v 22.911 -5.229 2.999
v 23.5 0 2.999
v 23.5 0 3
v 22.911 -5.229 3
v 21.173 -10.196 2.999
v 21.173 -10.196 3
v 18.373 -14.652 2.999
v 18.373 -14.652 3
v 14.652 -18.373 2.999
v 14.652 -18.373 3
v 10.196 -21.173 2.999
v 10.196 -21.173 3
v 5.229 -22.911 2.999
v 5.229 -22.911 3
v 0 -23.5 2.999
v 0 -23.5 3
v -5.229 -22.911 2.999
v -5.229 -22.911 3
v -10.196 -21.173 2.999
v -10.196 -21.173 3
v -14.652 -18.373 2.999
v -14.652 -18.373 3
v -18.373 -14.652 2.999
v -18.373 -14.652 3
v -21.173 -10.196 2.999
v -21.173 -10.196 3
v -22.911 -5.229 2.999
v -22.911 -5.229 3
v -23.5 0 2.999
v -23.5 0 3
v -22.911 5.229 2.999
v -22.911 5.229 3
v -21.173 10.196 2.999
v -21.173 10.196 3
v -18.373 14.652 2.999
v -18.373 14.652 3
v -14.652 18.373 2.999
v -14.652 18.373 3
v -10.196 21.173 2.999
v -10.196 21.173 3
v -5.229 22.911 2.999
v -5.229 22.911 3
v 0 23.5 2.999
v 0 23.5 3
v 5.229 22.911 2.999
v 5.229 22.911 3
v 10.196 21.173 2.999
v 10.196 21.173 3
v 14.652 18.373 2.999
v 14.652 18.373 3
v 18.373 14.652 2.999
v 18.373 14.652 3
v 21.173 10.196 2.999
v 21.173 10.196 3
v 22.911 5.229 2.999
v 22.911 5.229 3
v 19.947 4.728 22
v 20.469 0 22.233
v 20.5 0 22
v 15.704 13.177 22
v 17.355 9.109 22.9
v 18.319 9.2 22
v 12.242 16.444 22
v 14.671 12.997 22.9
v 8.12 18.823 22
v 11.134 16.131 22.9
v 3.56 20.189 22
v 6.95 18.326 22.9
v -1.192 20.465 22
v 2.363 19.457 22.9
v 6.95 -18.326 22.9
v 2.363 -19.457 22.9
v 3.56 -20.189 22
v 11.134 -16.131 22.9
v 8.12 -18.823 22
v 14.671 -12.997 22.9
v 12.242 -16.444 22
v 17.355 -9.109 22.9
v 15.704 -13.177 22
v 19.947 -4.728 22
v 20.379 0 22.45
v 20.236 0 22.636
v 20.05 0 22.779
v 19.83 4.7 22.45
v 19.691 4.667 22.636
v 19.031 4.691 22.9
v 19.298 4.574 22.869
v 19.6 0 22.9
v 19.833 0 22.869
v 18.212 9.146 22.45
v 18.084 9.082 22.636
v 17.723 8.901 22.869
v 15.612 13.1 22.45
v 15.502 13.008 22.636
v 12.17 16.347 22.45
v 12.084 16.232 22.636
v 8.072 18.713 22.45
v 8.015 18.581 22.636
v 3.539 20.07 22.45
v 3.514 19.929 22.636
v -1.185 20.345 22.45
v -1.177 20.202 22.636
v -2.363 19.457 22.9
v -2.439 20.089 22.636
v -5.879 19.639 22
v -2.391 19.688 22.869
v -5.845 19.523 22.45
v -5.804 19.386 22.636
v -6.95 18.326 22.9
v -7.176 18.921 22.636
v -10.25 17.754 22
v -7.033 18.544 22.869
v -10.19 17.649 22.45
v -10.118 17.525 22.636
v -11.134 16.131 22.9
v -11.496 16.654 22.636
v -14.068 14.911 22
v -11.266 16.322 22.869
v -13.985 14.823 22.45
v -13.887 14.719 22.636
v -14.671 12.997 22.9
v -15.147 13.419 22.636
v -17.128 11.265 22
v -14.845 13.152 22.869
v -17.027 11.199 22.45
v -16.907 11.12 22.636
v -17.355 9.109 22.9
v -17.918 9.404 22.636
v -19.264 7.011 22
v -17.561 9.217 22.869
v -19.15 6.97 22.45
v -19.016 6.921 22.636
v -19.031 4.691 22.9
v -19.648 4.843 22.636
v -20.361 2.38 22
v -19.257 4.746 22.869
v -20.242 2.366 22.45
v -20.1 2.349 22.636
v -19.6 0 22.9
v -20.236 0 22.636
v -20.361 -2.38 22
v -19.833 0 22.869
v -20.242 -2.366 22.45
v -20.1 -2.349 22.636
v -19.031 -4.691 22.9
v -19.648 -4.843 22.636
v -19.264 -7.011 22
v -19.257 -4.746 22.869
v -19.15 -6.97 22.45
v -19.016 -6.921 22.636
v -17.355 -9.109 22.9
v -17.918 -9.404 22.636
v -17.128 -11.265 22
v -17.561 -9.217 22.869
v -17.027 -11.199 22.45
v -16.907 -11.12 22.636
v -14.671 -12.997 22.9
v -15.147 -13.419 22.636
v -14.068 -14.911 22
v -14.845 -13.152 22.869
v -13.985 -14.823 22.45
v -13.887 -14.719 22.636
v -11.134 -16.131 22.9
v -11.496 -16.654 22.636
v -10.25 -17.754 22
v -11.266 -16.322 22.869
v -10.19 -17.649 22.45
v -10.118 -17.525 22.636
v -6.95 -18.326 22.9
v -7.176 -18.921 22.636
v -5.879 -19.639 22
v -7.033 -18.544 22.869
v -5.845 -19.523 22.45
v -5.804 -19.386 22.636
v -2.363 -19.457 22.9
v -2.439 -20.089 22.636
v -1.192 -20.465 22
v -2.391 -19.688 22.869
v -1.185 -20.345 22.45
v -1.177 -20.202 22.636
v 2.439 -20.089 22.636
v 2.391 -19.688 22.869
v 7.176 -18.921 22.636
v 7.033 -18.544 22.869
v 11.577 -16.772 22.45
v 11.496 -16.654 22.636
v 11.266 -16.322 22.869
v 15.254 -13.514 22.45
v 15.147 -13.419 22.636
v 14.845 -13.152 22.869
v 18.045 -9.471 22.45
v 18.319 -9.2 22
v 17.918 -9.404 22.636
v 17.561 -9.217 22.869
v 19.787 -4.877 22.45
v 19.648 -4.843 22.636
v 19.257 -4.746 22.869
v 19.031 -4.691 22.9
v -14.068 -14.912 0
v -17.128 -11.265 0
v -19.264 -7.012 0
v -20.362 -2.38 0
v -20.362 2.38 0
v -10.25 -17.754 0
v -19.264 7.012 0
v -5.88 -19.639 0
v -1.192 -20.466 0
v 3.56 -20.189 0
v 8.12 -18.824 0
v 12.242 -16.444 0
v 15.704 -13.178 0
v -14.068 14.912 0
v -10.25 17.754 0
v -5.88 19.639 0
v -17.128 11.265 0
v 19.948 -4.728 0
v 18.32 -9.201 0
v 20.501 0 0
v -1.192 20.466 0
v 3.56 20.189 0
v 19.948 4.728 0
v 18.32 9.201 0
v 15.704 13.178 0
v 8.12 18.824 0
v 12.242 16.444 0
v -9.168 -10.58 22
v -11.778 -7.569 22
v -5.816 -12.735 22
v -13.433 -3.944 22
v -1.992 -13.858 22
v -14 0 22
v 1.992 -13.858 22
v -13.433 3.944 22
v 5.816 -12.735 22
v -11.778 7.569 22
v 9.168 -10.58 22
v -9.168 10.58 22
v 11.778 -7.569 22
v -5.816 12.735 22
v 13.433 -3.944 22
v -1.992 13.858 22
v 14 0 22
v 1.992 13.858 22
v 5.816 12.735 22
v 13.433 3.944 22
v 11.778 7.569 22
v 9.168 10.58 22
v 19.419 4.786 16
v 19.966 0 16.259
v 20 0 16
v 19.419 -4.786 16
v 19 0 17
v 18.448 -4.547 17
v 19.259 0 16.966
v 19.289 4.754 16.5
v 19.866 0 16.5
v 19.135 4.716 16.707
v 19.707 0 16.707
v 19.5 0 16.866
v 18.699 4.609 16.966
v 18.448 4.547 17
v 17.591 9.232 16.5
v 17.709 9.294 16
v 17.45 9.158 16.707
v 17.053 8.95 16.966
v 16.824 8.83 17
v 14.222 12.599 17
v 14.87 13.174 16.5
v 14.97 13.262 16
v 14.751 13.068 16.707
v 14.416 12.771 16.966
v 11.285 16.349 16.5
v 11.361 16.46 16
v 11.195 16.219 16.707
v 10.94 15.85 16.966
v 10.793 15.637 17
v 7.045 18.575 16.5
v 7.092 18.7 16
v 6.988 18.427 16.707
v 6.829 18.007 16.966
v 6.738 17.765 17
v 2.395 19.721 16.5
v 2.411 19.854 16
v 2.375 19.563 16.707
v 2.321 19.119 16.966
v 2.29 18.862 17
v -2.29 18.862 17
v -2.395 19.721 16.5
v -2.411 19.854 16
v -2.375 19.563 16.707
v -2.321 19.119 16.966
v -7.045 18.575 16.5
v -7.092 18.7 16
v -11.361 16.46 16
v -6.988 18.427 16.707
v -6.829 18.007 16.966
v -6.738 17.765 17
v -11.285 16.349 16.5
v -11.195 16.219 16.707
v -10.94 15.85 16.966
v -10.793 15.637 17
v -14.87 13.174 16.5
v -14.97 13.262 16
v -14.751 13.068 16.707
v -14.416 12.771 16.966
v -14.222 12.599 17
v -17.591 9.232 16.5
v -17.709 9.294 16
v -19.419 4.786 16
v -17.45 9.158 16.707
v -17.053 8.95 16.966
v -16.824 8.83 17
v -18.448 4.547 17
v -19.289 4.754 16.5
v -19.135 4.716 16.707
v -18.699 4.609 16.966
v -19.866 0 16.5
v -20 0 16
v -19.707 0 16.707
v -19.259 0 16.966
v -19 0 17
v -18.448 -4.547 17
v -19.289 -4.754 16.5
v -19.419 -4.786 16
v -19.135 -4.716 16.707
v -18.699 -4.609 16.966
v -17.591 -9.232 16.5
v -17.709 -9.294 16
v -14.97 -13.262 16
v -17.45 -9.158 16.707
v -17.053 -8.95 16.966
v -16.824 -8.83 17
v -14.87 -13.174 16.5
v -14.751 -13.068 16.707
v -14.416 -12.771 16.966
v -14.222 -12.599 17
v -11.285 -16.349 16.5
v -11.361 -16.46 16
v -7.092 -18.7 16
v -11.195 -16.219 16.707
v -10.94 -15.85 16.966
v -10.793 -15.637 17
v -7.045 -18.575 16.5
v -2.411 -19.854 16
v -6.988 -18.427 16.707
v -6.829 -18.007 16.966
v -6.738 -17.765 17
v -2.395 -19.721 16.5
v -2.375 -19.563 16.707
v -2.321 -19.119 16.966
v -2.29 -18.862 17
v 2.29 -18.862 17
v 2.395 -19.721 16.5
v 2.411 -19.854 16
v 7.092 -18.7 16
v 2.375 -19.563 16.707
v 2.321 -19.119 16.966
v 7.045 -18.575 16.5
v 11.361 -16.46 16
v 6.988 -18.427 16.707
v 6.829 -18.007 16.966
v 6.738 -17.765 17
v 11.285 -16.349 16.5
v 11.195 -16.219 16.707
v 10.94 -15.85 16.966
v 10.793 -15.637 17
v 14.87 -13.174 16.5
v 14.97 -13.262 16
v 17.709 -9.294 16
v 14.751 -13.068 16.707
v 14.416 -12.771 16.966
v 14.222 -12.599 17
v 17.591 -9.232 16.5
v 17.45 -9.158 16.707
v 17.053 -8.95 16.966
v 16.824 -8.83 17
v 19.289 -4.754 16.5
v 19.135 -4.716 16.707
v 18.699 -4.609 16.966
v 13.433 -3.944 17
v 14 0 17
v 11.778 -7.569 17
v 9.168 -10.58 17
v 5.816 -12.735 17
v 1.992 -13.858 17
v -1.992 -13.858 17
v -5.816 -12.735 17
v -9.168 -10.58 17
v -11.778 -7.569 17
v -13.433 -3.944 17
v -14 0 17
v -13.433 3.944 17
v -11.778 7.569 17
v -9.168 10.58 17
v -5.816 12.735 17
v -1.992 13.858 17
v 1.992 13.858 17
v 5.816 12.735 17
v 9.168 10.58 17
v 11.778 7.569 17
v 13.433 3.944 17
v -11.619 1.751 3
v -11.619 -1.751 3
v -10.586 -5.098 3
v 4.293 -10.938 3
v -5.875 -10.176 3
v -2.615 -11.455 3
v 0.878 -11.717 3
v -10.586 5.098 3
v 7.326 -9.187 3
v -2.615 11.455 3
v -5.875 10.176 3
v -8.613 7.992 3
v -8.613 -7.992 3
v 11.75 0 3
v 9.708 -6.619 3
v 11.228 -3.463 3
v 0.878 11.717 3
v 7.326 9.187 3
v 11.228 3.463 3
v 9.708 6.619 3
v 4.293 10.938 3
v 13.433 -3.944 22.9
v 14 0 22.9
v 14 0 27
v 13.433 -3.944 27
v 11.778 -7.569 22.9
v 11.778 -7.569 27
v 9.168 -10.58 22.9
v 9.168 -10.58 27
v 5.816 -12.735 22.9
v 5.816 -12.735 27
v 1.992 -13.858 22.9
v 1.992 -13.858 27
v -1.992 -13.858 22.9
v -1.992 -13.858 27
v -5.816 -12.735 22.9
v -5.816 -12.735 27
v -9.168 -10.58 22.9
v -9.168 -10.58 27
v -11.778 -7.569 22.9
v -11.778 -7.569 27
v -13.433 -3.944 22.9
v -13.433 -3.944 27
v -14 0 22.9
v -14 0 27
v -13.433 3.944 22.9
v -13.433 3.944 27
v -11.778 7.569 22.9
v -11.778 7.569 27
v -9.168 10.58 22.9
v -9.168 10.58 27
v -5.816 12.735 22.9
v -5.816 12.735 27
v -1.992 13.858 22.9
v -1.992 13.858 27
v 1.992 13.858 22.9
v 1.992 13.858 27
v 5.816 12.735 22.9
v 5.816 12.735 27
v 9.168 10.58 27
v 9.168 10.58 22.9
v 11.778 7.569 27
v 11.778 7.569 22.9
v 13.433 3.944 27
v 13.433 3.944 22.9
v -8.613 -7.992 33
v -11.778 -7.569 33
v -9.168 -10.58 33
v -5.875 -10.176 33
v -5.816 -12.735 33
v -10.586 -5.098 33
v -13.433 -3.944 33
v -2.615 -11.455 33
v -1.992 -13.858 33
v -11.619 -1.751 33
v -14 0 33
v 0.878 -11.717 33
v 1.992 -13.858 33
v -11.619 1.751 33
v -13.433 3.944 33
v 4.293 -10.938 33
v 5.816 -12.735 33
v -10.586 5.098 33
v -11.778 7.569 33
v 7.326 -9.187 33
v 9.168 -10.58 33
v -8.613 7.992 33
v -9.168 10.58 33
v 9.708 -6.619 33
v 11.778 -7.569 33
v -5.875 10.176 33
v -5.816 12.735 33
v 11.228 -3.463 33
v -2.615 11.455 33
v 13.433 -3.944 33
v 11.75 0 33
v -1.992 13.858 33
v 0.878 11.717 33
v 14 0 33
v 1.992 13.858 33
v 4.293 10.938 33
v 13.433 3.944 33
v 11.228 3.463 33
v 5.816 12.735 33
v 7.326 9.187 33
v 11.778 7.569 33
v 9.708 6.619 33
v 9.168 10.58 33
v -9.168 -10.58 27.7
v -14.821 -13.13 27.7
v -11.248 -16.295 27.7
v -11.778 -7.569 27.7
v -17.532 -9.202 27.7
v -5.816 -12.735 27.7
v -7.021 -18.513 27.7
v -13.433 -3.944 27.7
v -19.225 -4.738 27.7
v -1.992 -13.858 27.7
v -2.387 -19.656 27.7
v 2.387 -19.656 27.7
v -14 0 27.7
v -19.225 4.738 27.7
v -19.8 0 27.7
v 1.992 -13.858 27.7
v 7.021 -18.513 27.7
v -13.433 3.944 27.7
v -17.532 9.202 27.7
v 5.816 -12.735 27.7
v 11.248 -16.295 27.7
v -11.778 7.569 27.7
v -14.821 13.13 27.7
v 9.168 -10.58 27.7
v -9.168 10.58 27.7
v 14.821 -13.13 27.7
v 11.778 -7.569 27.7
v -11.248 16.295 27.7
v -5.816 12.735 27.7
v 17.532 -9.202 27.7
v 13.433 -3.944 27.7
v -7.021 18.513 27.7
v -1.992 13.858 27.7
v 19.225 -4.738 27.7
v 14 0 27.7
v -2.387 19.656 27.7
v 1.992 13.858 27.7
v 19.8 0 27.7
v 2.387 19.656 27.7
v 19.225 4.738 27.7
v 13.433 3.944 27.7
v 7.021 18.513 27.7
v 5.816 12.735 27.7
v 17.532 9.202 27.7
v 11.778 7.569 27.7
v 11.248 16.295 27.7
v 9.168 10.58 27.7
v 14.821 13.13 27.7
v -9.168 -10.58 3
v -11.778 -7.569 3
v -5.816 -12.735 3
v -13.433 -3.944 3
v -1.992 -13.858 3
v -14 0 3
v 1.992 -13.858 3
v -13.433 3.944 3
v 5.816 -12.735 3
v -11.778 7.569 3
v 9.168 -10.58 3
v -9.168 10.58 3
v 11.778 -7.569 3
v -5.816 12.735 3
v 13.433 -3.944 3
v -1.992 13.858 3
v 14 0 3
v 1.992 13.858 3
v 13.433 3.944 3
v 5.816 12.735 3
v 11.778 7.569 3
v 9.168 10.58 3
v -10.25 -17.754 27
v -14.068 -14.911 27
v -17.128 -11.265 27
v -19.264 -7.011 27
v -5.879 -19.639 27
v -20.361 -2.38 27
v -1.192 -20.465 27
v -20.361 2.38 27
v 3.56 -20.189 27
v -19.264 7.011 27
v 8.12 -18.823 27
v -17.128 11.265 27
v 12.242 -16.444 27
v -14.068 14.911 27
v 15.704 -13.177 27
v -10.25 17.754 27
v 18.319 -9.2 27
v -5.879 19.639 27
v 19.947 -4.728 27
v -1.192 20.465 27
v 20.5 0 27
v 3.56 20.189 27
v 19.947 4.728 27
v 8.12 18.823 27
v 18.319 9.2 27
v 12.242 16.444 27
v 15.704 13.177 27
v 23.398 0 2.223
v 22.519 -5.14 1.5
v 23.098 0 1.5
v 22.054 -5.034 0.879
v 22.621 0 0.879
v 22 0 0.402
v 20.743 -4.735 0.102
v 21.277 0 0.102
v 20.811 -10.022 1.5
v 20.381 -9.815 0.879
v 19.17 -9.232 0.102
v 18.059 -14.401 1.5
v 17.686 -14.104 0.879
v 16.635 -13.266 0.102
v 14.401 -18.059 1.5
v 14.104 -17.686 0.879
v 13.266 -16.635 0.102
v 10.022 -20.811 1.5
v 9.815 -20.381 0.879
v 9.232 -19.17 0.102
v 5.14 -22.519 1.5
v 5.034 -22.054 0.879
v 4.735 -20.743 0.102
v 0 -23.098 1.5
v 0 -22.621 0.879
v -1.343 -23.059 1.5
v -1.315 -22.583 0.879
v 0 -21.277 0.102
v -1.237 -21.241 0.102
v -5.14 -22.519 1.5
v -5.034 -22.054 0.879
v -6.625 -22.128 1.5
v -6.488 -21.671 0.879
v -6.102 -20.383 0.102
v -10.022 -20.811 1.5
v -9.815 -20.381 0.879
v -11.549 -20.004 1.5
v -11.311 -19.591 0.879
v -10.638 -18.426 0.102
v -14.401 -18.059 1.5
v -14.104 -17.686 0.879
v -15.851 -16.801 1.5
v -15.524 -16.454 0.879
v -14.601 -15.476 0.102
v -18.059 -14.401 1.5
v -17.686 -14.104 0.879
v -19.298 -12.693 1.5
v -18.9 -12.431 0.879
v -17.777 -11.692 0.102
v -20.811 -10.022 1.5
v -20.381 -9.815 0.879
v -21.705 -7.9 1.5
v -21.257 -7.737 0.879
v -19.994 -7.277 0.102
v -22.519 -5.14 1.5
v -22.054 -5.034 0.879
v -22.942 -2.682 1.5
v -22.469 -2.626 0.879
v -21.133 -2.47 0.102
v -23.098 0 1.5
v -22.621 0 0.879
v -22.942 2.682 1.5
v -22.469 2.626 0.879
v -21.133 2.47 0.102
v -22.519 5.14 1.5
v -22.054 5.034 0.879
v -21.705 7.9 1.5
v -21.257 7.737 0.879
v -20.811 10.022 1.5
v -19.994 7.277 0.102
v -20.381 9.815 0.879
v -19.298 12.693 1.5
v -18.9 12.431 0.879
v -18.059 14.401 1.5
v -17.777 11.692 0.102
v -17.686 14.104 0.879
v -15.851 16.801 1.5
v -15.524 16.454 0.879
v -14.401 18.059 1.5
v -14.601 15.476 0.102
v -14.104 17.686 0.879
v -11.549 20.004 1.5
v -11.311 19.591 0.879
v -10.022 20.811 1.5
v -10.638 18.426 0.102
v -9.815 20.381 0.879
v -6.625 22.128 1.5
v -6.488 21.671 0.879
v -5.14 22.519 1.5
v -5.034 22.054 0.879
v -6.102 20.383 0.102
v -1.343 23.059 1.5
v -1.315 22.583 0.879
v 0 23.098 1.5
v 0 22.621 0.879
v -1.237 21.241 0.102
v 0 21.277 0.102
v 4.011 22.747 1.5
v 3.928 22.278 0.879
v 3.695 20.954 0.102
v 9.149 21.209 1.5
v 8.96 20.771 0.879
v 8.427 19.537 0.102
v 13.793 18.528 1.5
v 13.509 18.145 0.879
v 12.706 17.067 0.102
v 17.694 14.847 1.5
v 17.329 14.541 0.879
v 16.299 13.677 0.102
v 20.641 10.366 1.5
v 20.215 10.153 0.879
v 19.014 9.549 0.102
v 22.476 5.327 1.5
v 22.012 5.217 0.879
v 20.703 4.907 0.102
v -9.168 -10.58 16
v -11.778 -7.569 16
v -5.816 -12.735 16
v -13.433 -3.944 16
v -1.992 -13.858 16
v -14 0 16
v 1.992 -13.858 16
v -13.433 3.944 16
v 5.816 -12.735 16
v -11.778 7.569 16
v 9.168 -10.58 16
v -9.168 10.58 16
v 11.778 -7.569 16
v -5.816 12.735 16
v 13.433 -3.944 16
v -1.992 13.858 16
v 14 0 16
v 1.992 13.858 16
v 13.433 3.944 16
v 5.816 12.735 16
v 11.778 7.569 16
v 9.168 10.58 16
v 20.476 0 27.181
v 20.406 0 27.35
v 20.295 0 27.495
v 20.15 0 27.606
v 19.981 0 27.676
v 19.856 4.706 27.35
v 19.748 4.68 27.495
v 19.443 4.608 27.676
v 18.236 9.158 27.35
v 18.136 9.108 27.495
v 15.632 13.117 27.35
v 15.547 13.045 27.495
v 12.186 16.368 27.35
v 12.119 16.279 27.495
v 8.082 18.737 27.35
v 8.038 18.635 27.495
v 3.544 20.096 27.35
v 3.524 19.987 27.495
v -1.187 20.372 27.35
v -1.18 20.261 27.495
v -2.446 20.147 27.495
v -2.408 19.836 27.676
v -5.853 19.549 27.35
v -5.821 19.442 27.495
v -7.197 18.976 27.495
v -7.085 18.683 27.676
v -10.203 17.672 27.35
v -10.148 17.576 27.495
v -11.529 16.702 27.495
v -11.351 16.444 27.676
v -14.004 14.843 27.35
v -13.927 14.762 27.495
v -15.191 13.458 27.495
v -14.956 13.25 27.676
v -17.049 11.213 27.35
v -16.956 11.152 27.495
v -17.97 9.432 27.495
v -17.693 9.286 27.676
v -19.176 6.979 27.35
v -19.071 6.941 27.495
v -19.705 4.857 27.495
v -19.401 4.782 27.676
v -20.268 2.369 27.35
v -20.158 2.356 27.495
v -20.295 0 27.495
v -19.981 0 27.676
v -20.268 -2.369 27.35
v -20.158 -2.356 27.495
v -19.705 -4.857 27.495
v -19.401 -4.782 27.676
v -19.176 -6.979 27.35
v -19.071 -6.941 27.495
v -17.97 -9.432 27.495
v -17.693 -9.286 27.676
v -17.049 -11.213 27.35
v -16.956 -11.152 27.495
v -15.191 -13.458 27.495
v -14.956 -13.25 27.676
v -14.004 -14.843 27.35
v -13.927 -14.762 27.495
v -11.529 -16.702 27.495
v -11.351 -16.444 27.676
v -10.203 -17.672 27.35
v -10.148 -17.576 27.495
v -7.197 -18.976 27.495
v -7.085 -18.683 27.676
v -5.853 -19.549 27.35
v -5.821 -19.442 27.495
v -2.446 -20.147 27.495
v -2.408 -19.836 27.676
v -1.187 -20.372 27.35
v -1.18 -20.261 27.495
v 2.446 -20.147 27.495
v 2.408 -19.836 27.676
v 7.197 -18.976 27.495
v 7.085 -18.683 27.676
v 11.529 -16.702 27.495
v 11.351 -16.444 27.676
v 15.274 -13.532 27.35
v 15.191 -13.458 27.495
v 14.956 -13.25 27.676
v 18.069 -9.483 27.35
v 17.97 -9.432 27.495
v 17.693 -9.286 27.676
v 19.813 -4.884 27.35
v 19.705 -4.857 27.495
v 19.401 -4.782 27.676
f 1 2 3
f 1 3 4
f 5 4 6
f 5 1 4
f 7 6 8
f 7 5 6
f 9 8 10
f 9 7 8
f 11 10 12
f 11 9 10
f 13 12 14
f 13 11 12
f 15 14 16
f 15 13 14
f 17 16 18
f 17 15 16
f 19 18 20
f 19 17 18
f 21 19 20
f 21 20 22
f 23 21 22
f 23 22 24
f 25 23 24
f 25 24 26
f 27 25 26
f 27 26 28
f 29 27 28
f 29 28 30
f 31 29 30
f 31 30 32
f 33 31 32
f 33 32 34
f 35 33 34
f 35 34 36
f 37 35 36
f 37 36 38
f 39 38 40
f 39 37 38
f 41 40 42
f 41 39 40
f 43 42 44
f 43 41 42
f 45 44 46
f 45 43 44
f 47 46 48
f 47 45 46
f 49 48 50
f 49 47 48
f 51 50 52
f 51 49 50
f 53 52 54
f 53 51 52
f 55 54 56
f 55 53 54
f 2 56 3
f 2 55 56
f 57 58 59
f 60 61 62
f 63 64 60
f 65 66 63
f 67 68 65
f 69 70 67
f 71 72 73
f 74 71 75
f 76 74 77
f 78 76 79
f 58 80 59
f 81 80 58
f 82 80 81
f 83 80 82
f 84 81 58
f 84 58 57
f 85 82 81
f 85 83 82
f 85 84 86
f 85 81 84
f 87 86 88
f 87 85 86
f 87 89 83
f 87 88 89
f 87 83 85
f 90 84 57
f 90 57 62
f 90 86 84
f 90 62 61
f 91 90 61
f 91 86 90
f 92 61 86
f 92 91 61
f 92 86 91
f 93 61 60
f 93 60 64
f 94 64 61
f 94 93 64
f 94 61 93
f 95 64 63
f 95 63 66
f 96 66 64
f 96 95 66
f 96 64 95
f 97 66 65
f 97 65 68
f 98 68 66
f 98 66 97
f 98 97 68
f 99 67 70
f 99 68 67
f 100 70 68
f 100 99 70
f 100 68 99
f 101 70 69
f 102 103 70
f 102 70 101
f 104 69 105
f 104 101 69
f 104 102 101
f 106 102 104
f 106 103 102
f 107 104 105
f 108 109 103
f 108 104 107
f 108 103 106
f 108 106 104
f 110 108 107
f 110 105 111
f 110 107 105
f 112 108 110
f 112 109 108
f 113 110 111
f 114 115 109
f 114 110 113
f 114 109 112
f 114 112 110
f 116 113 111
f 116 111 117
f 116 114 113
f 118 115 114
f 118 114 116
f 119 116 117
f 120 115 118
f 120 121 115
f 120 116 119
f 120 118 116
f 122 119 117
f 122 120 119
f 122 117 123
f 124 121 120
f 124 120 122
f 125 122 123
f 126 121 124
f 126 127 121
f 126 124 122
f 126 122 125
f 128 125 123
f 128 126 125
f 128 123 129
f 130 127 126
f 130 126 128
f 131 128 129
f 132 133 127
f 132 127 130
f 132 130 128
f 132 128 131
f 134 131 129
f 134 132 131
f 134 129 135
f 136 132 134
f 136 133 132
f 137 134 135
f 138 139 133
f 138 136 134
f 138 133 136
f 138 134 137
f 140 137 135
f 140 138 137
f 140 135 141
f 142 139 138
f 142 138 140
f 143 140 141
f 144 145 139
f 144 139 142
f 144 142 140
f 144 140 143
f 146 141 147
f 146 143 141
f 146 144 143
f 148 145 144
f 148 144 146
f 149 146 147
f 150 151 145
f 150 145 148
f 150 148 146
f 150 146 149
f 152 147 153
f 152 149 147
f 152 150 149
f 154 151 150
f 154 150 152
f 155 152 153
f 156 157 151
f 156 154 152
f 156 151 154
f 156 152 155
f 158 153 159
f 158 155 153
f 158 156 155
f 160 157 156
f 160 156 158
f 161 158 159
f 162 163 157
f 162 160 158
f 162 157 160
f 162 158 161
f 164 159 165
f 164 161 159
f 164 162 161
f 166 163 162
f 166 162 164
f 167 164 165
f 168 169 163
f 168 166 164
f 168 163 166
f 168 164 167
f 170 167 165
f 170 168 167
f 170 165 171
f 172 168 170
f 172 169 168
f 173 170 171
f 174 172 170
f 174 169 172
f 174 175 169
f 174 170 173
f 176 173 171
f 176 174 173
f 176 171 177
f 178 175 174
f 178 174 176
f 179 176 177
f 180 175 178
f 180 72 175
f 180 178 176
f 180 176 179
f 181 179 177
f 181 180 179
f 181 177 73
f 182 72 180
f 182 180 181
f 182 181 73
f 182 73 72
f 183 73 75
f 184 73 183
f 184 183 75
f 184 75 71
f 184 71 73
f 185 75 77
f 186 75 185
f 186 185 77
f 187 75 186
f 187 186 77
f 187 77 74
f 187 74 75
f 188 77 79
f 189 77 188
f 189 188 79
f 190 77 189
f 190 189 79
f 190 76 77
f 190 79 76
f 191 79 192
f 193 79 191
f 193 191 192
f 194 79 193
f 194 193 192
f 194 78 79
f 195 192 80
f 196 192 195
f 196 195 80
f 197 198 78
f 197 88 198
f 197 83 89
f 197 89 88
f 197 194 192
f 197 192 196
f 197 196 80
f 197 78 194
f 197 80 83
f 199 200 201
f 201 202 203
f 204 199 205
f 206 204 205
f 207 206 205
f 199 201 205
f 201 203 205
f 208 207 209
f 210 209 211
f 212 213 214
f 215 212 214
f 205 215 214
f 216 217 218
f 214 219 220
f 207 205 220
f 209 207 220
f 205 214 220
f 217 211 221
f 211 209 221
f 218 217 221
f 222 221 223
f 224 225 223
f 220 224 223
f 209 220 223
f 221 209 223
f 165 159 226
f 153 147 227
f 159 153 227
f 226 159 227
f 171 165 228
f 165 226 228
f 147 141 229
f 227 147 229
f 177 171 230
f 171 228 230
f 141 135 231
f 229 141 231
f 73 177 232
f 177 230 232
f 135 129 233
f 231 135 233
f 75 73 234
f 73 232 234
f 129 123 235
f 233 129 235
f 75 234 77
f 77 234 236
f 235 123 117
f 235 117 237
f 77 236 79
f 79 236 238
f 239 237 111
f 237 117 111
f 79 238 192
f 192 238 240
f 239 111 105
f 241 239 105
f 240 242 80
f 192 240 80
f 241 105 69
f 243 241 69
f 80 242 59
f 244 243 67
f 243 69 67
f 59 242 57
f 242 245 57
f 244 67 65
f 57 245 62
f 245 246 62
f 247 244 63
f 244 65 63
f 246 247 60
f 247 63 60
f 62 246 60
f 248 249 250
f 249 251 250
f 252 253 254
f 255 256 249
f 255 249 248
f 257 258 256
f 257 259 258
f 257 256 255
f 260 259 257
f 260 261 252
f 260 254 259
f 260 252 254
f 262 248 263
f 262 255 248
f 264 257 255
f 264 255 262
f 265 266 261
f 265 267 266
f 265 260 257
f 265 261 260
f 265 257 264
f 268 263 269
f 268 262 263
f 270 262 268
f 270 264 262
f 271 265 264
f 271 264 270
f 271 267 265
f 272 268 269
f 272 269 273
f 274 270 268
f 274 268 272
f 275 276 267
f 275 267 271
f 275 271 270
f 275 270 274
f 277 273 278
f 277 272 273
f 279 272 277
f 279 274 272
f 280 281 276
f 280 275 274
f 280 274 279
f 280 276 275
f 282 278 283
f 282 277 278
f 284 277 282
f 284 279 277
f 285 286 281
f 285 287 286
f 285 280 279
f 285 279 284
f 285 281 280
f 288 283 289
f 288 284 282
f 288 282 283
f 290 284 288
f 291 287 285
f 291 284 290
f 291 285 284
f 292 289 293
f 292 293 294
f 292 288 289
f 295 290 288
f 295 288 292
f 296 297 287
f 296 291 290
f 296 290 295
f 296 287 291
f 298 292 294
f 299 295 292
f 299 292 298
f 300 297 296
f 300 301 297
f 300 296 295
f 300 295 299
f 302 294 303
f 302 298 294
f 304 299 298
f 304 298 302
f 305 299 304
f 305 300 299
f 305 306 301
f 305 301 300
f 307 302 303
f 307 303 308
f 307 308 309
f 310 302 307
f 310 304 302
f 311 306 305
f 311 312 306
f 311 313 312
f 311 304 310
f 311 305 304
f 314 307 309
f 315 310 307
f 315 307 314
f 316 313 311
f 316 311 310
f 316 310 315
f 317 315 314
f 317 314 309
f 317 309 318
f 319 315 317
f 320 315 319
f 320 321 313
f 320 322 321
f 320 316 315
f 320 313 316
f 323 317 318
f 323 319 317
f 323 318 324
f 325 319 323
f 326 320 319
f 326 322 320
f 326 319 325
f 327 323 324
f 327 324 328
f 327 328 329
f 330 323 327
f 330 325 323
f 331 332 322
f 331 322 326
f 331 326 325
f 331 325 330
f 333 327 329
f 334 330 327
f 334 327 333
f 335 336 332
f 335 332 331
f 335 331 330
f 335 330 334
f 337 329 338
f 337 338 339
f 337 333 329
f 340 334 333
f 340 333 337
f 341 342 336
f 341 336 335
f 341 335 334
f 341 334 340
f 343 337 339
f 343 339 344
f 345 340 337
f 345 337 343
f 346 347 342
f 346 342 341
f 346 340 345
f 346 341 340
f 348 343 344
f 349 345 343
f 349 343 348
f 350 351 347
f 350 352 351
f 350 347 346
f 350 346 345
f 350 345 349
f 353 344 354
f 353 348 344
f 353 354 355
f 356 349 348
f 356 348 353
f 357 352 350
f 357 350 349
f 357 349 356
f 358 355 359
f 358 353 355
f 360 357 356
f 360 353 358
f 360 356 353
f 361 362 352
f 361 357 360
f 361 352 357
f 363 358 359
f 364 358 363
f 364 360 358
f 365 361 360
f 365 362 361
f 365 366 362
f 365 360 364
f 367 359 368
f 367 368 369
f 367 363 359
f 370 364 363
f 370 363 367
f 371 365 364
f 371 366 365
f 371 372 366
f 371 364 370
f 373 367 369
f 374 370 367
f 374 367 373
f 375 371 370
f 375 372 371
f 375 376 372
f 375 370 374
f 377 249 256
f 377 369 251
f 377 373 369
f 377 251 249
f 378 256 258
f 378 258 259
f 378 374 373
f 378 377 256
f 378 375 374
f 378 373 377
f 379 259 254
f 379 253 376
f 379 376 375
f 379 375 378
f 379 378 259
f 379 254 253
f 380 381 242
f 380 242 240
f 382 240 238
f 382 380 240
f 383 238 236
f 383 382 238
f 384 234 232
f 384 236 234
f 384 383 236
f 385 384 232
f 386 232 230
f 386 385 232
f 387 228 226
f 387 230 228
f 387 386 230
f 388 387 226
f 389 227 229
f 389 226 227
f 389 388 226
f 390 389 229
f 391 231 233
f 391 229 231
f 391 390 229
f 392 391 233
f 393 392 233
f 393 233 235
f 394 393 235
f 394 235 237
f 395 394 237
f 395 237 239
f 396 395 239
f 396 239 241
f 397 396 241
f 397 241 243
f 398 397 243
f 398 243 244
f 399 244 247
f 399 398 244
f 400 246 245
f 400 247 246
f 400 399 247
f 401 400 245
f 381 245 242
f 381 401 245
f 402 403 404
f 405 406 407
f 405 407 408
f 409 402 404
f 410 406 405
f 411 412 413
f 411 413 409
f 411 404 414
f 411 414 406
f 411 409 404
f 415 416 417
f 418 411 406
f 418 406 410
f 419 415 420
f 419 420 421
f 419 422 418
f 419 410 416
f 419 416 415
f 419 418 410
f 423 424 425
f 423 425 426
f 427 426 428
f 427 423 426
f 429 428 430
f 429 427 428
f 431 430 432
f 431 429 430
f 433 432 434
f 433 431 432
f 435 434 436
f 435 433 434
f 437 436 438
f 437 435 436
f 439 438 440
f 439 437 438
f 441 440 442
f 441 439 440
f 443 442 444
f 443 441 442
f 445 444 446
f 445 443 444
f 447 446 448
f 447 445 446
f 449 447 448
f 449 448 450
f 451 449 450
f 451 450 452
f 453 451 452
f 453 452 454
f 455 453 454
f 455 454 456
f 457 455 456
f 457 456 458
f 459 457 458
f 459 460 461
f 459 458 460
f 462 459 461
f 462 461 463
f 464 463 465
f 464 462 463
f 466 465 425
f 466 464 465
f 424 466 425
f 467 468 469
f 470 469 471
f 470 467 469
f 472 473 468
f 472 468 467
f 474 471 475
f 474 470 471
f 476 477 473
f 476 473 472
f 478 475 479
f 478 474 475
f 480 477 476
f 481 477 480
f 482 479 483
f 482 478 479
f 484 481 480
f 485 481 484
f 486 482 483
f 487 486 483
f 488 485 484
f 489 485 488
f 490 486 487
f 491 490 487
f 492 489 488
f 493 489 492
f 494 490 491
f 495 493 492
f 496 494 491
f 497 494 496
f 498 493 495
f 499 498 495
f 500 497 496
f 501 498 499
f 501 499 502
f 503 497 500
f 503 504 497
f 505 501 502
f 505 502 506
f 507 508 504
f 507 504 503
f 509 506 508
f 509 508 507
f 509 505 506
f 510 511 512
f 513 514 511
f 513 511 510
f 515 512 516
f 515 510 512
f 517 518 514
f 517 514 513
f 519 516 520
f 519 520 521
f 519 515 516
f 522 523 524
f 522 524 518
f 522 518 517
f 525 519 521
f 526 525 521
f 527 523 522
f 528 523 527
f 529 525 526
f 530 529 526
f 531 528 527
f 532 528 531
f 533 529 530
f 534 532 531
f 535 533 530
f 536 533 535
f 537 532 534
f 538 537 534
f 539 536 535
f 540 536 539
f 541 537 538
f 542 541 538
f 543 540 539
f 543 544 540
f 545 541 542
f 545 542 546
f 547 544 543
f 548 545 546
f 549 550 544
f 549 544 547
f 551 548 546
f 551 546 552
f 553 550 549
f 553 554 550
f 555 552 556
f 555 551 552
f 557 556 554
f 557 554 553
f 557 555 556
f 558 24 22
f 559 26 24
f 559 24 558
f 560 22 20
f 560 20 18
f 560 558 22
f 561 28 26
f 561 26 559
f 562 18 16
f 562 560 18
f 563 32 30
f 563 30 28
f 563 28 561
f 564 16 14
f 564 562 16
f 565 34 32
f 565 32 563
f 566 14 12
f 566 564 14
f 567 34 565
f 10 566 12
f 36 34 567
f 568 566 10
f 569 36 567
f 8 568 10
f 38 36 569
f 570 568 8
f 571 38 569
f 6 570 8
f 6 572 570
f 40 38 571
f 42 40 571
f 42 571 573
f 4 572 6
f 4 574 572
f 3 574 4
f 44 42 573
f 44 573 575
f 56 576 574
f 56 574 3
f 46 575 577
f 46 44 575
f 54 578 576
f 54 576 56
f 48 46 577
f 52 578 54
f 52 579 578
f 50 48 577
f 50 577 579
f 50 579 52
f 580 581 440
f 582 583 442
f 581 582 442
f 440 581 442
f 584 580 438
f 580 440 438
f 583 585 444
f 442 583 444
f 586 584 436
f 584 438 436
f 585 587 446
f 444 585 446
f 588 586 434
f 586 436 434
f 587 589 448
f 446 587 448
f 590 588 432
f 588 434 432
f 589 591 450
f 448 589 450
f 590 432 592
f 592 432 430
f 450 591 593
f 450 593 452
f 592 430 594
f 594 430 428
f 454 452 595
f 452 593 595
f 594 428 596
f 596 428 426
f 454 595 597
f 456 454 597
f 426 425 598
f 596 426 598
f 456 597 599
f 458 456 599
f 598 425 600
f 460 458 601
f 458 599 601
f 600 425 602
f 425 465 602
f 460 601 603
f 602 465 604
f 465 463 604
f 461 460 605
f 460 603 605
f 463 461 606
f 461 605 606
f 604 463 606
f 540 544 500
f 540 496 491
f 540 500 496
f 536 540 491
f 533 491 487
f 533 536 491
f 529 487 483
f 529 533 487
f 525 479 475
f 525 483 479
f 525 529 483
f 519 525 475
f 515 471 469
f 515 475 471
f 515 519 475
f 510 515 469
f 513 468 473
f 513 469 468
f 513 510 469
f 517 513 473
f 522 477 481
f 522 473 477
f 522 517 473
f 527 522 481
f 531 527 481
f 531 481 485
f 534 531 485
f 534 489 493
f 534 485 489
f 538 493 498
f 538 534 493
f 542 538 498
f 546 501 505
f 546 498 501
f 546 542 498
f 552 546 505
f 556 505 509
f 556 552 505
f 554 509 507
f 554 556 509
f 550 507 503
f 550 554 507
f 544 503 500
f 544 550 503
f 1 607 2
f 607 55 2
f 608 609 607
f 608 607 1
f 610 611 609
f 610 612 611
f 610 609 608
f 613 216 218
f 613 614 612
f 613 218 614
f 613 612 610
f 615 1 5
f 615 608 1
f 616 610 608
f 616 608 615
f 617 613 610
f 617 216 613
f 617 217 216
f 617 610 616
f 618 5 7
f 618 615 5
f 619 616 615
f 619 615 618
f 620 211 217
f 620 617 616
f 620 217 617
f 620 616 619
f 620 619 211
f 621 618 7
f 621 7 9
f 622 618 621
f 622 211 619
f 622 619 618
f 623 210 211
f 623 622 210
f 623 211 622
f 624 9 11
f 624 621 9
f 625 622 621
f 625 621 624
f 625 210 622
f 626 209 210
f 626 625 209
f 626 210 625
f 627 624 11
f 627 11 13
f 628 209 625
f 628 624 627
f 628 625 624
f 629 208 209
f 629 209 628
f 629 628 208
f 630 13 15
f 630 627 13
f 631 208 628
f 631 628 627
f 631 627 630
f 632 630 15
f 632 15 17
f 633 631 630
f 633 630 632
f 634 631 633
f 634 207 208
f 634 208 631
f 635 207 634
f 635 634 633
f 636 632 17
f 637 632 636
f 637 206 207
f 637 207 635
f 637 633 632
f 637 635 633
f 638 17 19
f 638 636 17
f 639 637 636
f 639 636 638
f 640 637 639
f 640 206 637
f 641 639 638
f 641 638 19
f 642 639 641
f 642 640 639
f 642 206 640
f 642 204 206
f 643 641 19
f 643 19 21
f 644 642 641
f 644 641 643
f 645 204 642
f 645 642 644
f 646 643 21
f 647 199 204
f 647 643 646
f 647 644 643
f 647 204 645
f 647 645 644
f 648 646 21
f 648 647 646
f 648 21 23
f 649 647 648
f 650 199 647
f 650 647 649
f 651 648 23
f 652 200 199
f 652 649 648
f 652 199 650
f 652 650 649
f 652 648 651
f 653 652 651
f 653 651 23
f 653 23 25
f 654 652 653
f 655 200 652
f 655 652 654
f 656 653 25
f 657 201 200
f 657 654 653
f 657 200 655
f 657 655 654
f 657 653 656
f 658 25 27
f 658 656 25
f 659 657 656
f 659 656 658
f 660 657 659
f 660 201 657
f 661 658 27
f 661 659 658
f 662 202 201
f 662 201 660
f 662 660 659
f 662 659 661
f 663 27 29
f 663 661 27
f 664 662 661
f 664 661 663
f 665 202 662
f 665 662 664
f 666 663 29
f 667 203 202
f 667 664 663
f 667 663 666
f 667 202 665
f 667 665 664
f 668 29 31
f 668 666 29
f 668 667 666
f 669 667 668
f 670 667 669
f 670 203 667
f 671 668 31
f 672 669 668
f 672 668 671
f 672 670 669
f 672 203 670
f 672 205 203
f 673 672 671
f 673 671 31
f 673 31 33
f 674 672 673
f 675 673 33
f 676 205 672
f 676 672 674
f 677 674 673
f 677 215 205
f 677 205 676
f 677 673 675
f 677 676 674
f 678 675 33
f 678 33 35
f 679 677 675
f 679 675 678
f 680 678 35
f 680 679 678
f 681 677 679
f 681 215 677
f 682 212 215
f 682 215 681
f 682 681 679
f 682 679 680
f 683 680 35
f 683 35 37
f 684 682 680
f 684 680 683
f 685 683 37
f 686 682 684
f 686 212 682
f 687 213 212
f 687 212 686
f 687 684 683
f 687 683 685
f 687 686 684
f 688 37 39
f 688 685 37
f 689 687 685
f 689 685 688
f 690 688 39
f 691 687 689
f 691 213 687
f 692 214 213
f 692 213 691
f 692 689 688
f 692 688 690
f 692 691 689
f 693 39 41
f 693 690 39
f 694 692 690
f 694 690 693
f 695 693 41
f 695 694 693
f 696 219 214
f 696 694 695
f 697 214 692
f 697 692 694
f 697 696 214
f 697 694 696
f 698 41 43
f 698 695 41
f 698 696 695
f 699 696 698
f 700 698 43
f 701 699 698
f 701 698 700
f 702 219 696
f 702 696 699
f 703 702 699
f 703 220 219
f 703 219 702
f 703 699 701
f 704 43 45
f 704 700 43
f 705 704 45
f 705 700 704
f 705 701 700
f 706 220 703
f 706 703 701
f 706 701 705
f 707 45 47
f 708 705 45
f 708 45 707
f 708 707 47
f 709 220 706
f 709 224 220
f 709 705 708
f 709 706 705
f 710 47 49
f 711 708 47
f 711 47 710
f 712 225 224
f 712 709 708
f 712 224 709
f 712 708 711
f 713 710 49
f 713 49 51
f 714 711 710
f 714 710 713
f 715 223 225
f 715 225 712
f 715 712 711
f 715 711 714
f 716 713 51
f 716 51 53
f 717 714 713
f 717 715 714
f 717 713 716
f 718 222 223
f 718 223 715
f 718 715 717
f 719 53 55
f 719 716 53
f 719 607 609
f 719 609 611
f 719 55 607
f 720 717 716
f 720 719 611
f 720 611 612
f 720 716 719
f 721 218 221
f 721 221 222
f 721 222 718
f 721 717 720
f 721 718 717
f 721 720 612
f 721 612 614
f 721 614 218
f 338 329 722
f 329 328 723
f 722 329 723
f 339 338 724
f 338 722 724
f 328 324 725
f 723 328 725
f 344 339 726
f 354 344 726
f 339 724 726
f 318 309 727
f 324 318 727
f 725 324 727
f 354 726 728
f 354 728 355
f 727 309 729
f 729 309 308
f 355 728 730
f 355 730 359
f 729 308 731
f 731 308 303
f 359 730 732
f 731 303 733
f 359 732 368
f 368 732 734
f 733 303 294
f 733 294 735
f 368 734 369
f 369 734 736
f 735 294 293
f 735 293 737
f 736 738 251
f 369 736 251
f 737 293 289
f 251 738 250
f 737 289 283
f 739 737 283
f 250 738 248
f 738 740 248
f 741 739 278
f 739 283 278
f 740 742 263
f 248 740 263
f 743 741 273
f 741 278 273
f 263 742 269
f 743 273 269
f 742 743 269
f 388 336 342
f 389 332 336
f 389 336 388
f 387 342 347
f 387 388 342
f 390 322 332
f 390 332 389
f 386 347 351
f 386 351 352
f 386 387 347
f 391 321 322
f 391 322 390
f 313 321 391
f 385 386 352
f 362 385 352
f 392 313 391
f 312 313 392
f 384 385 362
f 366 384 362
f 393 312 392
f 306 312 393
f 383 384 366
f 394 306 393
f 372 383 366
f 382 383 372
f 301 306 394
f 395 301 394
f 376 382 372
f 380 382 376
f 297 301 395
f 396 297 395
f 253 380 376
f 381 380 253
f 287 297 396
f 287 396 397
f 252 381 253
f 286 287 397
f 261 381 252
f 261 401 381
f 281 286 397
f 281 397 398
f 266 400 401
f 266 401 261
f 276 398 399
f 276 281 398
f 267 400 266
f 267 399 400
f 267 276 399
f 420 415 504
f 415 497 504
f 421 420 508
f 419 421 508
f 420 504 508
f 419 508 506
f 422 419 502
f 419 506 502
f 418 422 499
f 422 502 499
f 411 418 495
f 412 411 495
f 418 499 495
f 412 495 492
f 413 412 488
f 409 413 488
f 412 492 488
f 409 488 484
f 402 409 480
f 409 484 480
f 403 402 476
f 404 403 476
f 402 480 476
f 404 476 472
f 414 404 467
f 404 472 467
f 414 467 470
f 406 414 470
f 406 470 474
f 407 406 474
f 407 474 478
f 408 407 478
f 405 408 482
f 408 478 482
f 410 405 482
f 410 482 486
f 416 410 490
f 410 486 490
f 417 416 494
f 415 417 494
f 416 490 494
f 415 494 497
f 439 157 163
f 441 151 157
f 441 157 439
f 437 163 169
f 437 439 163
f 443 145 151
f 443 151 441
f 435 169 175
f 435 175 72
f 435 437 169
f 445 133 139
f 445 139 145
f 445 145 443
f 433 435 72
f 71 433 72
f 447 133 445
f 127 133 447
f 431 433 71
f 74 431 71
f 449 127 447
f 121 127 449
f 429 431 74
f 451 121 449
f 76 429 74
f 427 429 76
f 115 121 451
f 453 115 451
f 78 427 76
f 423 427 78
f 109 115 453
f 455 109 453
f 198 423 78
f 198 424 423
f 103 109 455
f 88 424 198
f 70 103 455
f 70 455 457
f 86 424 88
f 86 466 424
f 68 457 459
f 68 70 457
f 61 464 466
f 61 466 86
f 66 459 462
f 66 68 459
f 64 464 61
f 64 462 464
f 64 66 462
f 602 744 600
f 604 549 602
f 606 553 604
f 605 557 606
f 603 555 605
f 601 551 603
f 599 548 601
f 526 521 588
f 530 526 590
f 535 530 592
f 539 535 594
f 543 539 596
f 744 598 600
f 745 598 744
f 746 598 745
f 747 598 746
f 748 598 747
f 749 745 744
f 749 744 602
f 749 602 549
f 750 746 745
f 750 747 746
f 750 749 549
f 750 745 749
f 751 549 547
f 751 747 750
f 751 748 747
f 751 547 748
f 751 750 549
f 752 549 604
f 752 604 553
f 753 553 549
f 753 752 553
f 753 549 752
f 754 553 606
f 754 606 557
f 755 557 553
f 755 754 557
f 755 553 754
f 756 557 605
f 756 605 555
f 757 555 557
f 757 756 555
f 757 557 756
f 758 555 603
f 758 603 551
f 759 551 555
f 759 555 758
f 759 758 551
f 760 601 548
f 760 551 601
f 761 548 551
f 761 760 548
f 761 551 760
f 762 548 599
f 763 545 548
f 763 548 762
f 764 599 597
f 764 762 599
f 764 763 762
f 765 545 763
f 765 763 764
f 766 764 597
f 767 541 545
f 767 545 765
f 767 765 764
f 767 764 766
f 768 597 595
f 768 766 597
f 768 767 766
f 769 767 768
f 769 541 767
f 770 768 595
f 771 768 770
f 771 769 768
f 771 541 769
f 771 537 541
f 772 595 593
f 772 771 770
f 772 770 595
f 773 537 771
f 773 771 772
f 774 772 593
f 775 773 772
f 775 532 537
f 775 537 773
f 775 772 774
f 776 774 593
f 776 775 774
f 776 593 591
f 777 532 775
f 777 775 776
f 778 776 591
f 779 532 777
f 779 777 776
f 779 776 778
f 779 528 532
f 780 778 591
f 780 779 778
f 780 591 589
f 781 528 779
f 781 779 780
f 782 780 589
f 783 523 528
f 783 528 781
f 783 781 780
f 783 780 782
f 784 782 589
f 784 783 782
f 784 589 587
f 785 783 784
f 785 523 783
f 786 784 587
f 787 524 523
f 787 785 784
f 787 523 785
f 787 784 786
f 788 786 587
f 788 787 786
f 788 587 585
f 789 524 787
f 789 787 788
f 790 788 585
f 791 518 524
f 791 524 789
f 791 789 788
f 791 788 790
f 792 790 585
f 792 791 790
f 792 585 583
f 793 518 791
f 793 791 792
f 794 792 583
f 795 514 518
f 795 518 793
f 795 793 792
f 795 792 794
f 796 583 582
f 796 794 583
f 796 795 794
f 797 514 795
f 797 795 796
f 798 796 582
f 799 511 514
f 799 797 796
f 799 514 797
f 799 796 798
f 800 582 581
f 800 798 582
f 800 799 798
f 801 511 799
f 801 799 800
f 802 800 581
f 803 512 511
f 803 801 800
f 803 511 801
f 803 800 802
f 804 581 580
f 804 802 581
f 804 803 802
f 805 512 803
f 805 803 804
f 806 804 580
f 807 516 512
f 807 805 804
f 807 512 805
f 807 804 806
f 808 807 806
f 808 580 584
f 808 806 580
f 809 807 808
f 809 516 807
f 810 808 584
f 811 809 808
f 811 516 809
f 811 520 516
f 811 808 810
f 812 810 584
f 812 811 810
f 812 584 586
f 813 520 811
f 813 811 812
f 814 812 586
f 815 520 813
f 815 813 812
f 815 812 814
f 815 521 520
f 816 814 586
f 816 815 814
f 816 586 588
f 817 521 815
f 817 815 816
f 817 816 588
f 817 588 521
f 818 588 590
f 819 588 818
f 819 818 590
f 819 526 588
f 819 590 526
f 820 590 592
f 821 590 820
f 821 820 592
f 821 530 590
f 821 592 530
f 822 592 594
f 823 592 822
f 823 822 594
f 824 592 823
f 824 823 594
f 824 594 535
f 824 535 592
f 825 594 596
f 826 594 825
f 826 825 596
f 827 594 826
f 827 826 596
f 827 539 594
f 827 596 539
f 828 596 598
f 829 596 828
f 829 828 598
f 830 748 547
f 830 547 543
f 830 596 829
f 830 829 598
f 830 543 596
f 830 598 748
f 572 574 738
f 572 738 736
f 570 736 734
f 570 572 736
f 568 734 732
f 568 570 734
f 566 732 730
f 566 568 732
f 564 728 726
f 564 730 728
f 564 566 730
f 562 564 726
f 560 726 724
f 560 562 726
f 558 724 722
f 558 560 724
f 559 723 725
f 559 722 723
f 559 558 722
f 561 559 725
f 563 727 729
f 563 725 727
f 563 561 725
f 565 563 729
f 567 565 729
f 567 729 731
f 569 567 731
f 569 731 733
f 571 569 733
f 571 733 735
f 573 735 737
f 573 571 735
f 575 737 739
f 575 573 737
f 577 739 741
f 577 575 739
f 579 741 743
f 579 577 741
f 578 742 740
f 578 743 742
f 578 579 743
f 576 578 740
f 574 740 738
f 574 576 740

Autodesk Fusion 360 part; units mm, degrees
sketch "Sketch1" plane through (0, 0, 0) normal (0, 0, 1) x (1, 0, 0)
  circle A0 centre (0, 0) radius 23.5
  dimension "d1" = 47
extrude "Extrude1" add sketch "Sketch1" along normal blind 3 makes body 1
fillet "Fillet1" radius 3 1 edges at (-21.9097, -8.498, 0) on bodies 1
sketch "Sketch2" plane through (0, 0, 3) normal (0, 0, 1) x (1, 0, 0)
  circle A0 centre (0, 0) radius 23.5
  circle A1 centre (0, 0) radius 14
  dimension "d5" = 28
extrude "Extrude2" add sketch "Sketch2" along normal blind 13 contours A1 bodies 1
sketch "Sketch3" plane through (0, 0, 16) normal (0, 0, 1) x (1, 0, 0)
  circle A0 centre (0, 0) radius 14
  circle A1 centre (0, 0) radius 20
  dimension "d8" = 40
extrude "Extrude3" add sketch "Sketch3" along normal blind 1 separate body makes body 2
fillet "Fillet2" radius 1 1 edges at (-18.6465, -7.2323, 17) on bodies 2
sketch "Sketch4" plane through (0, 0, 16) normal (0, 0, 1) x (1, 0, 0)
  circle A0 centre (0, 0) radius 14
  circle A1 centre (0, 0) radius 20.5
extrude "Extrude4" add sketch "Sketch4" along normal blind 6 contours A0 bodies 1 2
sketch "Sketch5" plane through (0, 0, 22) normal (0, 0, 1) x (1, 0, 0)
  circle A0 centre (0, 0) radius 14
  circle A1 centre (0, 0) radius 20.5
  circle A2 centre (0, 0) radius 18.5
  dimension "d14" = 37
extrude "Extrude5" add sketch "Sketch5" along normal blind 0.9 separate body contours A1 | A2 makes body 3
fillet "Fillet3" radius 0.9 1 edges at (-19.1127, -7.4131, 22.9) on bodies 3
extrude "Extrude6" add 1 faces at (3.6071, -3.6485, 22) along direction (0, 0, 1) blind 5 on bodies 1 bodies 1 3
sketch "Sketch6" plane through (0, 0, 27) normal (0, 0, 1) x (1, 0, 0)
  circle A0 centre (0, 0) radius 14
  circle A1 centre (0, 0) radius 20.5
  circle A2 centre (0, 0) radius 17
  dimension "d20" = 34
extrude "Extrude7" add sketch "Sketch6" along normal blind 0.7 separate body contours A1 | A2 makes body 4
fillet "Fillet4" radius 0.7 1 edges at (-19.1127, -7.4131, 27.7) on bodies 4
extrude "Extrude8" add 1 faces at (3.6071, -3.6485, 27) along direction (0, 0, 1) blind 6 on bodies 1 bodies 1 4
sketch "Sketch7" plane through (0, 0, 33) normal (0, 0, 1) x (1, 0, 0)
  circle A0 centre (0, 0) radius 14
  circle A1 centre (0, 0) radius 20.5
  circle A2 centre (0, 0) radius 11.75
  dimension "d26" = 23.5
extrude "Extrude9" cut sketch "Sketch7" against normal blind 30 contours A2 bodies 1
equation "d24 = 30 mm - 13 mm - 6 mm - 5 mm"
